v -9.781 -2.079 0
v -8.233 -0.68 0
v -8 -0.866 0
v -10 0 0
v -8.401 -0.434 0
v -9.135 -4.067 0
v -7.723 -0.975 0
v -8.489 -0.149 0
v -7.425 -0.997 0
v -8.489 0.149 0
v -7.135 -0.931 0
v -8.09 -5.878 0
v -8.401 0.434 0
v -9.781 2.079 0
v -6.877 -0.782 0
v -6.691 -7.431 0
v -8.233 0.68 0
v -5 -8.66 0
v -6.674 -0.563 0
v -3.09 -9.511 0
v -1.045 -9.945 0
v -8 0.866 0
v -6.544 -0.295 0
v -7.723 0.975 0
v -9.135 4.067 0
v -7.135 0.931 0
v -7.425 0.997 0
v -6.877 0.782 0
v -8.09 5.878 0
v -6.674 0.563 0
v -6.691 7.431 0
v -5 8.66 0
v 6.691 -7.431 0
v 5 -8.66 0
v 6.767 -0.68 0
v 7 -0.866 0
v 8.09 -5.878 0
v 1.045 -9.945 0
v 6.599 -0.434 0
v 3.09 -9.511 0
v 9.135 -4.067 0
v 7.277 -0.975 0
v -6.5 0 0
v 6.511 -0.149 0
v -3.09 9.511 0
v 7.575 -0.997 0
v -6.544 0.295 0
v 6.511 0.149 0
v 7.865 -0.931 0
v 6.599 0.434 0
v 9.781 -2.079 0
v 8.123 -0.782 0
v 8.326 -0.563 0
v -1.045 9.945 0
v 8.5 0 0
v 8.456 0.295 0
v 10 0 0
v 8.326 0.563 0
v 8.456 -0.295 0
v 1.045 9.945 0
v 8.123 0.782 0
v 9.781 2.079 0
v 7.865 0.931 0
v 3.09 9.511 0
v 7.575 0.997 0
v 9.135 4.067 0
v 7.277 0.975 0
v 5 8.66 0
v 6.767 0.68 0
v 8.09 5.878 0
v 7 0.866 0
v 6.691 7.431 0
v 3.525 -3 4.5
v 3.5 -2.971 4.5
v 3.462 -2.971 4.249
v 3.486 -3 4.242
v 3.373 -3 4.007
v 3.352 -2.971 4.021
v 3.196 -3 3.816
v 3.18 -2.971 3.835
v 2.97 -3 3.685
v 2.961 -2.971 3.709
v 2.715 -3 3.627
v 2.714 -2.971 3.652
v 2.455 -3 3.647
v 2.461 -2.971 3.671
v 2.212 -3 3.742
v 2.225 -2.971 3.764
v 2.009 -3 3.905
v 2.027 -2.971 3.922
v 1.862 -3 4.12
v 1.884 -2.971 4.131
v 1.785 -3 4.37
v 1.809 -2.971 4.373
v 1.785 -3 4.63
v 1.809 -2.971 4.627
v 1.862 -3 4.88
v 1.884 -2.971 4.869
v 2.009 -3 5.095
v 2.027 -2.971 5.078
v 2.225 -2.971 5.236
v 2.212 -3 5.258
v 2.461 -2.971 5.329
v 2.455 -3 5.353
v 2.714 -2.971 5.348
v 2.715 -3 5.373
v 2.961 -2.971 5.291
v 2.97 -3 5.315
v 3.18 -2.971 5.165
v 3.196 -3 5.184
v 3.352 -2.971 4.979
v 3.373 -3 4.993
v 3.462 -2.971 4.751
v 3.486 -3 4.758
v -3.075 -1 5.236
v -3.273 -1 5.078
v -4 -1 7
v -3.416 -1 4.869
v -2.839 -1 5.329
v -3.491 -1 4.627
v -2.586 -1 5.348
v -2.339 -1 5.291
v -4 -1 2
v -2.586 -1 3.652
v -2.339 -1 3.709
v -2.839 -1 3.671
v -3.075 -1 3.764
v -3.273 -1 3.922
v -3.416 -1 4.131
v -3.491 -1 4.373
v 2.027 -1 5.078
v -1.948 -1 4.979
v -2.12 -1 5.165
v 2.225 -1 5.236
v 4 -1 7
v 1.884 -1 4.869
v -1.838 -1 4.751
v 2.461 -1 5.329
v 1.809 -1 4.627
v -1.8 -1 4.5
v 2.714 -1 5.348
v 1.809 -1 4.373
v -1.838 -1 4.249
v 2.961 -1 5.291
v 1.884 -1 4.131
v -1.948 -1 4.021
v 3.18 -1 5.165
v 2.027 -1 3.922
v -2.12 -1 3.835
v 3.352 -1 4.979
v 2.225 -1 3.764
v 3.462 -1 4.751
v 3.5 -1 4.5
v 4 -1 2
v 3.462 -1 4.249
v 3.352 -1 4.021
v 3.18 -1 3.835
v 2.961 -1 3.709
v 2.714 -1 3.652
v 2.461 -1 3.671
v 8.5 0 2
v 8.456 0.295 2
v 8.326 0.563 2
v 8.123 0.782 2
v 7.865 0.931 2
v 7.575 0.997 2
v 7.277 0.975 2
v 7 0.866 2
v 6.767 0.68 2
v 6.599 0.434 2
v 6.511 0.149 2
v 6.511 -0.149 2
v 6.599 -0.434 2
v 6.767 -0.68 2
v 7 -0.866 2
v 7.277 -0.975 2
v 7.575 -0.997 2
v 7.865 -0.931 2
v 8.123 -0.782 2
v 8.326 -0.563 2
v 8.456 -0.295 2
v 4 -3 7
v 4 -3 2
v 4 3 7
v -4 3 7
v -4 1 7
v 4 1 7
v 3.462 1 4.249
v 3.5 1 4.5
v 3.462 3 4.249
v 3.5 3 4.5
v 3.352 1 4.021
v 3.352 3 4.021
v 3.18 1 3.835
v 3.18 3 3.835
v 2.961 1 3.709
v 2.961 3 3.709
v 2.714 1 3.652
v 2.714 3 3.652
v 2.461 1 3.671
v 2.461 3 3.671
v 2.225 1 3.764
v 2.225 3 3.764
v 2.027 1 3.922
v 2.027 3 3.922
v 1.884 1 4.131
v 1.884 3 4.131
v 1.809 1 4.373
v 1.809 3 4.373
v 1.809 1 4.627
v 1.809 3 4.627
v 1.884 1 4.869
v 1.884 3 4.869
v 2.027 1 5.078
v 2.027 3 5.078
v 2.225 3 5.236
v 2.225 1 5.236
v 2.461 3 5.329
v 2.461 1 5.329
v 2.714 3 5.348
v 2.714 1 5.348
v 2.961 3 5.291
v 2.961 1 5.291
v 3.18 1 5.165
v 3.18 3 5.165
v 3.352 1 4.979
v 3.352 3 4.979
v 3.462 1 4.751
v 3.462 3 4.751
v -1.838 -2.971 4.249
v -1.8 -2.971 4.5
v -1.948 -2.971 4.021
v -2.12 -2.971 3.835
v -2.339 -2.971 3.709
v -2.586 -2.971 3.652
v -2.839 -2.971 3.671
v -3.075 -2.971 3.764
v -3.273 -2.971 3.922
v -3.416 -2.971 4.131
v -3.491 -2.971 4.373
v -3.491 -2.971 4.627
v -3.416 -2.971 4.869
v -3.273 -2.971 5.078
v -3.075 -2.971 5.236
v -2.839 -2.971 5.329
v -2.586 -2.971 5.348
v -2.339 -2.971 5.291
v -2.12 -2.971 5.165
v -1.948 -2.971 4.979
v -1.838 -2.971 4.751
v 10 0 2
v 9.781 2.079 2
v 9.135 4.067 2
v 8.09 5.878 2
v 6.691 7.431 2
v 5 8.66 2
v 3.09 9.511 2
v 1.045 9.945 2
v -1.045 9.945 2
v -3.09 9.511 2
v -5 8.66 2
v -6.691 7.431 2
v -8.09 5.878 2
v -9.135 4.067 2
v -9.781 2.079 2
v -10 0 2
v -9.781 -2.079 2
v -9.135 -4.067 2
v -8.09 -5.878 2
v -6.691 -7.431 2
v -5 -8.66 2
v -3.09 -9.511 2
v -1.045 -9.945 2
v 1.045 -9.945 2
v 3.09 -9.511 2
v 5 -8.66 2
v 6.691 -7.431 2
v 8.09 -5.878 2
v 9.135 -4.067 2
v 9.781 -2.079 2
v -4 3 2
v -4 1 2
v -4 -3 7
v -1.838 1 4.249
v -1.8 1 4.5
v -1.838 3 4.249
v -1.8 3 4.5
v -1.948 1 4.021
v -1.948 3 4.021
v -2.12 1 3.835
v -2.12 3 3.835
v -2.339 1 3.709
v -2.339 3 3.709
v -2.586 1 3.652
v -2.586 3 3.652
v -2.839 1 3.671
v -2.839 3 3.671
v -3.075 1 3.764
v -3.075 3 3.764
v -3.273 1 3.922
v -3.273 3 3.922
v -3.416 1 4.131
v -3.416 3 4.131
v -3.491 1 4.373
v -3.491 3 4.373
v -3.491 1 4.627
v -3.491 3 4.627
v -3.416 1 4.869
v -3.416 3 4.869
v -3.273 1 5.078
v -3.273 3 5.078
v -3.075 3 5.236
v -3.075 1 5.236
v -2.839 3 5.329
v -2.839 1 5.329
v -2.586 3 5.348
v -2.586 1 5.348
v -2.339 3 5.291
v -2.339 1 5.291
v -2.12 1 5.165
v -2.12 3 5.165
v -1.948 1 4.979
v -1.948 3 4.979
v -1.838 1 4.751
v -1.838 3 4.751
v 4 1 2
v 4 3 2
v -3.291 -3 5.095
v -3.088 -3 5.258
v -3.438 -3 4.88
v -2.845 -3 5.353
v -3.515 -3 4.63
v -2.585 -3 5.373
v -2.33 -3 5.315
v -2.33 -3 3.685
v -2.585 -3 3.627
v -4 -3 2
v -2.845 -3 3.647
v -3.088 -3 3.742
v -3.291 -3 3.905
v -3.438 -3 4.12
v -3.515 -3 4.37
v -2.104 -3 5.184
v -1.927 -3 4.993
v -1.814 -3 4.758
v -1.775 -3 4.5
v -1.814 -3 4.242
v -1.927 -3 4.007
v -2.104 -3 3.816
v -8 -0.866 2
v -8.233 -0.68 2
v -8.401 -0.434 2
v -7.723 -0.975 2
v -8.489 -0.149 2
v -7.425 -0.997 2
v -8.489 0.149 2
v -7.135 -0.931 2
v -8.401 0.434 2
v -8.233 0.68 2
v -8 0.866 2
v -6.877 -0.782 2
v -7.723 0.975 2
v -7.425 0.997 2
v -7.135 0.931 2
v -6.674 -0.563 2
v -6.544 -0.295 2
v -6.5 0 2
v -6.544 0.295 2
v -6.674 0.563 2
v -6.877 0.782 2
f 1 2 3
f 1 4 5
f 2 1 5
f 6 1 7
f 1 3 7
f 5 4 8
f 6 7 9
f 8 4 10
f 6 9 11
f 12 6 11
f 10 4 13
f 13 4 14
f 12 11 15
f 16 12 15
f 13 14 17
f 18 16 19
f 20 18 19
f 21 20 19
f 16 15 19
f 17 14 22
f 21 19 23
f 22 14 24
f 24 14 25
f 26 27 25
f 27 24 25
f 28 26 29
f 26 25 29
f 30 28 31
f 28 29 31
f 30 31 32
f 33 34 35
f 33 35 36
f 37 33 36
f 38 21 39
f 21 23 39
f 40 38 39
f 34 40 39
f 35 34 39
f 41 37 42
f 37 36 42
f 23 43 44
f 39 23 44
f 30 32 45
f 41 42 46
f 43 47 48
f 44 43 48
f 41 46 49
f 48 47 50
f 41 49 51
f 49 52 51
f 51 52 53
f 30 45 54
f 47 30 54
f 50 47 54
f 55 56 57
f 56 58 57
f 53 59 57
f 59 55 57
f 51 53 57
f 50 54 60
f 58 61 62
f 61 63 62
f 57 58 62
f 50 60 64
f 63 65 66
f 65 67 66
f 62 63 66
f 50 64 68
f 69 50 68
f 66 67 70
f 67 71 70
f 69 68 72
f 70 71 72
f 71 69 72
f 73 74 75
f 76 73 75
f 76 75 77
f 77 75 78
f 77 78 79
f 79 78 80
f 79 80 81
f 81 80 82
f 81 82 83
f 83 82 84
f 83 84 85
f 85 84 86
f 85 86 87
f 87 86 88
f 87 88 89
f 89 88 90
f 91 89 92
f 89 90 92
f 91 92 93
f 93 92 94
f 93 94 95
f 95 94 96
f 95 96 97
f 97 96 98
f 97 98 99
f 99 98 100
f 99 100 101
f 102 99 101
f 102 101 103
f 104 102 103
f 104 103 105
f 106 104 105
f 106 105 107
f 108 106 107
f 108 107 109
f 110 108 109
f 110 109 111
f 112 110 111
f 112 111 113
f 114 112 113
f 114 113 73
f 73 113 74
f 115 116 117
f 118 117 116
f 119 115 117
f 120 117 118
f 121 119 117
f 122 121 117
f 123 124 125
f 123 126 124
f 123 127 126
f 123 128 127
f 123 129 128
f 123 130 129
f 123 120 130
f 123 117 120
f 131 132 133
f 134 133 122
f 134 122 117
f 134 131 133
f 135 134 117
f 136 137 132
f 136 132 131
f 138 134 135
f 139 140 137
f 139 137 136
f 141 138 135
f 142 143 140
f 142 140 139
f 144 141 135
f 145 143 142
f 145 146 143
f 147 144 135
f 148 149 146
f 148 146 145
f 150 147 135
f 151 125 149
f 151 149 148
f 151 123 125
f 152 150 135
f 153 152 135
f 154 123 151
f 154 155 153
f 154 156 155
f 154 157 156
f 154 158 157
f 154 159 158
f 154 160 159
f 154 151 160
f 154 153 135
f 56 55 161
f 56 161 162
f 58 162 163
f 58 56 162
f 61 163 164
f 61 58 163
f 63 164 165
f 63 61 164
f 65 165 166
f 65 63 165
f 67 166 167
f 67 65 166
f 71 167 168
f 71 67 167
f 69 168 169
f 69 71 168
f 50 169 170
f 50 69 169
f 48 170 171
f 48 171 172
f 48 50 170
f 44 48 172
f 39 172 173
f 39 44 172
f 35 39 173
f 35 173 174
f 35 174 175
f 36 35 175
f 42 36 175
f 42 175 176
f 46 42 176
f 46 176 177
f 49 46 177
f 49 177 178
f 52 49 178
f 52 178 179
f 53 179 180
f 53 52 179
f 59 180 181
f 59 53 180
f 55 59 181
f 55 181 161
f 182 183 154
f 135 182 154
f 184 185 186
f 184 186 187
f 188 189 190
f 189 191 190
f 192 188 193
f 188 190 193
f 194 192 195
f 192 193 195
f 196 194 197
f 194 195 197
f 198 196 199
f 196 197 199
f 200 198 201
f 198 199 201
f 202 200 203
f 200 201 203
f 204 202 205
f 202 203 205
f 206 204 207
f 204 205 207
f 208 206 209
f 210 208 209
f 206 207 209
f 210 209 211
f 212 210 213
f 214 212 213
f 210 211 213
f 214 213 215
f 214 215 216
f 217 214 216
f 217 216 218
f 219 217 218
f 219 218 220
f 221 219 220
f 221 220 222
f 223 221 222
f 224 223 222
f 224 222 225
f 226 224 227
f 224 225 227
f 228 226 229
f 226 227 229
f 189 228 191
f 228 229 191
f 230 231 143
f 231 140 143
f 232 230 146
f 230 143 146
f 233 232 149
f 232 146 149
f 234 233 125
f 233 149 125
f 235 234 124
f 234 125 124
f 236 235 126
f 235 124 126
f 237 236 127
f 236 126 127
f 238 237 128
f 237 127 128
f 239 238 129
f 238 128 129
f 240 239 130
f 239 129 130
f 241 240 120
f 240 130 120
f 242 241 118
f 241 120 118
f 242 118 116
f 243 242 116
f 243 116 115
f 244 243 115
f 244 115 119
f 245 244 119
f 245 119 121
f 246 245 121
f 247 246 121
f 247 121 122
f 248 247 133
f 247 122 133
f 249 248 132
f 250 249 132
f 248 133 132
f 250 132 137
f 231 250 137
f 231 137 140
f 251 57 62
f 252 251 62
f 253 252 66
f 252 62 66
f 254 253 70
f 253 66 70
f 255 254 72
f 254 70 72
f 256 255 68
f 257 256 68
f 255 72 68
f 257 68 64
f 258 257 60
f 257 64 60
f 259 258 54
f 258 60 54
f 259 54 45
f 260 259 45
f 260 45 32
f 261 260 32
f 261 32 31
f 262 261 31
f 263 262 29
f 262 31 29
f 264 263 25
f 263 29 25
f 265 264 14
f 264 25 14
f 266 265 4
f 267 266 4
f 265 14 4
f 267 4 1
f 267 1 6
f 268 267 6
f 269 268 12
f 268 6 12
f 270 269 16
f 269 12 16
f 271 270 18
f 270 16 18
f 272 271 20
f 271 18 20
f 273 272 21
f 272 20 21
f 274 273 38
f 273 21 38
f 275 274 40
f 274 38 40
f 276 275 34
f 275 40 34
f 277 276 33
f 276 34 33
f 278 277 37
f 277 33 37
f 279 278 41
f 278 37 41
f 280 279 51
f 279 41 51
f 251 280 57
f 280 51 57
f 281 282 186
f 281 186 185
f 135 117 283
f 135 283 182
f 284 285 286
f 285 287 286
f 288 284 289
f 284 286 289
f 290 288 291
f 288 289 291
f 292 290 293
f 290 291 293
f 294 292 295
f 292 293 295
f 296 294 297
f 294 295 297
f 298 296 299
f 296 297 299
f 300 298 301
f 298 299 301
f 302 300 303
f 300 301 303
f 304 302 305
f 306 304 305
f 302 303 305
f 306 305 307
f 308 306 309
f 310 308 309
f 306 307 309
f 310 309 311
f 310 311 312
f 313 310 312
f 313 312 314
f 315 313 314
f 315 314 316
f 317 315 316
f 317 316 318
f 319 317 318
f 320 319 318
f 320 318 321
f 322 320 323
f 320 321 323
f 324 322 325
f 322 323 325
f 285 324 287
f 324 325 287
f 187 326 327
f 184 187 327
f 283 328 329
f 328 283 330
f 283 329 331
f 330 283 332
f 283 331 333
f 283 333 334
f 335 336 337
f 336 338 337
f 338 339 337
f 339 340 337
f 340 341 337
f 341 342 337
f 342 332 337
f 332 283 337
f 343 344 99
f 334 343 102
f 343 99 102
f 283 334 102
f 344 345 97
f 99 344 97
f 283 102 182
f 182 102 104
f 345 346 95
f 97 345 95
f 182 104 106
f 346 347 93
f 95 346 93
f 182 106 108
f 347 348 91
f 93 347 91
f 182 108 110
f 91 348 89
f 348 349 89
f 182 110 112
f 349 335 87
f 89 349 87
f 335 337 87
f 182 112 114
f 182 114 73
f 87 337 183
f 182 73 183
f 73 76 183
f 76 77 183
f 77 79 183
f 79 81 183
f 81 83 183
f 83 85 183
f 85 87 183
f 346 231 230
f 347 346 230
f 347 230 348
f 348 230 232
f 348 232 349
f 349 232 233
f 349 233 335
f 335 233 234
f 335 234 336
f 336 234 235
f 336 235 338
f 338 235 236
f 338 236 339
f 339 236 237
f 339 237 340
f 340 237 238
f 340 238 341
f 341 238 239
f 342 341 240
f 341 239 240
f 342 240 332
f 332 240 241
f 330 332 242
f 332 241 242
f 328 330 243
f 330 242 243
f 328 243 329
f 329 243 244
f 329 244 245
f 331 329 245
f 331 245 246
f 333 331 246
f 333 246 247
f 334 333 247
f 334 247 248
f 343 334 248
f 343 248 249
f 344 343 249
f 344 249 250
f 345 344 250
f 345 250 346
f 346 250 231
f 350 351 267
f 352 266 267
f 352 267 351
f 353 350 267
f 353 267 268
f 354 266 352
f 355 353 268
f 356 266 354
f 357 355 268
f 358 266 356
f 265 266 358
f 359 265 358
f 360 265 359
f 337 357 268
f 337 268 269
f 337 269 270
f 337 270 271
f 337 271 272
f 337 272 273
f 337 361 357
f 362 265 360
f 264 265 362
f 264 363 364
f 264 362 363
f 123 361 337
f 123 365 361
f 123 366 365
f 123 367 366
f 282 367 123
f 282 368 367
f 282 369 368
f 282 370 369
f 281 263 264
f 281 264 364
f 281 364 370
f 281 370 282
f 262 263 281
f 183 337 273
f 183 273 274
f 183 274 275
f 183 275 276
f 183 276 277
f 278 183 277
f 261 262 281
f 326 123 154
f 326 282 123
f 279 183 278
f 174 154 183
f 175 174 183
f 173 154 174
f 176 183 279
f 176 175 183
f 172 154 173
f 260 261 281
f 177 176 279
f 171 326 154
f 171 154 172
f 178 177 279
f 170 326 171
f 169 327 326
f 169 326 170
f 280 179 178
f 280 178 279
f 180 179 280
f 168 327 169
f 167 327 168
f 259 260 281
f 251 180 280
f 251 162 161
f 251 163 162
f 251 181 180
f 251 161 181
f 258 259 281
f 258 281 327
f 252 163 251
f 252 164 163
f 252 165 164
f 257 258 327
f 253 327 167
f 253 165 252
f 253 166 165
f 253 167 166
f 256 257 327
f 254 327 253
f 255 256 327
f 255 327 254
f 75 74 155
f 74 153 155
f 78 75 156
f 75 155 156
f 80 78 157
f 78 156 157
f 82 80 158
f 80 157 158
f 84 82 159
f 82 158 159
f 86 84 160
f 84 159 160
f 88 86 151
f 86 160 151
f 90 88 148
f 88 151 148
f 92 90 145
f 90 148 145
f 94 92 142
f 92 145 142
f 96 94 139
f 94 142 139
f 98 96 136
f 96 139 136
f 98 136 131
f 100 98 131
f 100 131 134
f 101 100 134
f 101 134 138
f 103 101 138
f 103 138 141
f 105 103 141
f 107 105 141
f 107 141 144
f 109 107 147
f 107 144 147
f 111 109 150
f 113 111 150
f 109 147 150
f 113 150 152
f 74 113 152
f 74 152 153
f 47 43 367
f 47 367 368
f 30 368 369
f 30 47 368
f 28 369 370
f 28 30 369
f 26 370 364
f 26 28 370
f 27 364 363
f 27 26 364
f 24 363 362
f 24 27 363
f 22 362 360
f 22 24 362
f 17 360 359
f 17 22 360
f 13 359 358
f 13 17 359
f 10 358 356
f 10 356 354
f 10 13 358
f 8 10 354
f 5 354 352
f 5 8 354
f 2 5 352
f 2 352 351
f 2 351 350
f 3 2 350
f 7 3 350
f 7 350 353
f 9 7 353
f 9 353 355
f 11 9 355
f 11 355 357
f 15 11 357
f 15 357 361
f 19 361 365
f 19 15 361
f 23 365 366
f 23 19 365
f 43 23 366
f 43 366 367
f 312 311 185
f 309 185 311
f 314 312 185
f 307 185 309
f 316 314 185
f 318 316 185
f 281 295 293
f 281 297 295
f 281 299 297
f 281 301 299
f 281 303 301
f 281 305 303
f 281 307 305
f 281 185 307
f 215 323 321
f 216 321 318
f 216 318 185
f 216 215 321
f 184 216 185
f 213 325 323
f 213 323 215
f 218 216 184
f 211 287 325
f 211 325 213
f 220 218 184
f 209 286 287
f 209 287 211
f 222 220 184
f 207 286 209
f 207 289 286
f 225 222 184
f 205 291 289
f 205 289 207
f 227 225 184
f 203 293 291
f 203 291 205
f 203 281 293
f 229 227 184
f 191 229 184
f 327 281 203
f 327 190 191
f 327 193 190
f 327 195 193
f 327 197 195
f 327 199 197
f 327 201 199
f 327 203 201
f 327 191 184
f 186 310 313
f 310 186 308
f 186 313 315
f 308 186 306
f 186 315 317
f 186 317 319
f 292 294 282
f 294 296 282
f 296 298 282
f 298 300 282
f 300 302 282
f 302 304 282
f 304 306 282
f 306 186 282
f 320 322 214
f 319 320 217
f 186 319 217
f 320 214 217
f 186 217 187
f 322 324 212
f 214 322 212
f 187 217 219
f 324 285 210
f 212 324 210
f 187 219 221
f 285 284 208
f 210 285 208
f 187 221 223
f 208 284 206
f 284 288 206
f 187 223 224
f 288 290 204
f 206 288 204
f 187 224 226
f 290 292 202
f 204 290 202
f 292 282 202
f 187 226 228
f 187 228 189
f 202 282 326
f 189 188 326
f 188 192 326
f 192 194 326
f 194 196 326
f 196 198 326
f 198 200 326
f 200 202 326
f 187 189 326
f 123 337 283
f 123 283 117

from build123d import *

# Parameters (mm, degrees)
CROQUIS1_R                               = 10
CROQUIS1_R_2                             = 1
SALIENTE_EXTRUIR1_DEPTH                  = 2
CROQUIS2_W                               = 8
CROQUIS2_H                               = 2
SALIENTE_EXTRUIR2_DEPTH                  = 5
TALADRO_DE_MARGEN_PARA_M1_61_D           = 1.7
TALADRO_DE_MARGEN_PARA_M1_61_CSINK_D     = 1.75
TALADRO_DE_MARGEN_PARA_M1_61_CSINK_ANGLE = 82


with BuildPart() as part:
    # Croquis1 → Saliente-Extruir1 (new body)
    with BuildSketch(Plane.XY):
        Circle(CROQUIS1_R)
        with Locations((-7.5, 0)):
            Circle(CROQUIS1_R_2, mode=Mode.SUBTRACT)
        with Locations((7.5, 0)):
            Circle(CROQUIS1_R_2, mode=Mode.SUBTRACT)
    extrude(amount=SALIENTE_EXTRUIR1_DEPTH)

    # Croquis2 → Saliente-Extruir2 (add)
    with BuildSketch(Plane.XY.offset(2)):
        with Locations((0, 2)):
            Rectangle(CROQUIS2_W, CROQUIS2_H)
        with Locations((0, -2)):
            Rectangle(CROQUIS2_W, CROQUIS2_H)
    extrude(amount=SALIENTE_EXTRUIR2_DEPTH)

    # Taladro de margen para M1.61 (through all)
    with Locations(Plane(origin=(0, -3, 0), x_dir=(-1, 0, 0), z_dir=(0, -1, 0))):
        with Locations((-2.65, -4.5), (2.65, -4.5)):
            CounterSinkHole(TALADRO_DE_MARGEN_PARA_M1_61_D / 2, TALADRO_DE_MARGEN_PARA_M1_61_CSINK_D / 2, counter_sink_angle=TALADRO_DE_MARGEN_PARA_M1_61_CSINK_ANGLE)


solid = part.part
